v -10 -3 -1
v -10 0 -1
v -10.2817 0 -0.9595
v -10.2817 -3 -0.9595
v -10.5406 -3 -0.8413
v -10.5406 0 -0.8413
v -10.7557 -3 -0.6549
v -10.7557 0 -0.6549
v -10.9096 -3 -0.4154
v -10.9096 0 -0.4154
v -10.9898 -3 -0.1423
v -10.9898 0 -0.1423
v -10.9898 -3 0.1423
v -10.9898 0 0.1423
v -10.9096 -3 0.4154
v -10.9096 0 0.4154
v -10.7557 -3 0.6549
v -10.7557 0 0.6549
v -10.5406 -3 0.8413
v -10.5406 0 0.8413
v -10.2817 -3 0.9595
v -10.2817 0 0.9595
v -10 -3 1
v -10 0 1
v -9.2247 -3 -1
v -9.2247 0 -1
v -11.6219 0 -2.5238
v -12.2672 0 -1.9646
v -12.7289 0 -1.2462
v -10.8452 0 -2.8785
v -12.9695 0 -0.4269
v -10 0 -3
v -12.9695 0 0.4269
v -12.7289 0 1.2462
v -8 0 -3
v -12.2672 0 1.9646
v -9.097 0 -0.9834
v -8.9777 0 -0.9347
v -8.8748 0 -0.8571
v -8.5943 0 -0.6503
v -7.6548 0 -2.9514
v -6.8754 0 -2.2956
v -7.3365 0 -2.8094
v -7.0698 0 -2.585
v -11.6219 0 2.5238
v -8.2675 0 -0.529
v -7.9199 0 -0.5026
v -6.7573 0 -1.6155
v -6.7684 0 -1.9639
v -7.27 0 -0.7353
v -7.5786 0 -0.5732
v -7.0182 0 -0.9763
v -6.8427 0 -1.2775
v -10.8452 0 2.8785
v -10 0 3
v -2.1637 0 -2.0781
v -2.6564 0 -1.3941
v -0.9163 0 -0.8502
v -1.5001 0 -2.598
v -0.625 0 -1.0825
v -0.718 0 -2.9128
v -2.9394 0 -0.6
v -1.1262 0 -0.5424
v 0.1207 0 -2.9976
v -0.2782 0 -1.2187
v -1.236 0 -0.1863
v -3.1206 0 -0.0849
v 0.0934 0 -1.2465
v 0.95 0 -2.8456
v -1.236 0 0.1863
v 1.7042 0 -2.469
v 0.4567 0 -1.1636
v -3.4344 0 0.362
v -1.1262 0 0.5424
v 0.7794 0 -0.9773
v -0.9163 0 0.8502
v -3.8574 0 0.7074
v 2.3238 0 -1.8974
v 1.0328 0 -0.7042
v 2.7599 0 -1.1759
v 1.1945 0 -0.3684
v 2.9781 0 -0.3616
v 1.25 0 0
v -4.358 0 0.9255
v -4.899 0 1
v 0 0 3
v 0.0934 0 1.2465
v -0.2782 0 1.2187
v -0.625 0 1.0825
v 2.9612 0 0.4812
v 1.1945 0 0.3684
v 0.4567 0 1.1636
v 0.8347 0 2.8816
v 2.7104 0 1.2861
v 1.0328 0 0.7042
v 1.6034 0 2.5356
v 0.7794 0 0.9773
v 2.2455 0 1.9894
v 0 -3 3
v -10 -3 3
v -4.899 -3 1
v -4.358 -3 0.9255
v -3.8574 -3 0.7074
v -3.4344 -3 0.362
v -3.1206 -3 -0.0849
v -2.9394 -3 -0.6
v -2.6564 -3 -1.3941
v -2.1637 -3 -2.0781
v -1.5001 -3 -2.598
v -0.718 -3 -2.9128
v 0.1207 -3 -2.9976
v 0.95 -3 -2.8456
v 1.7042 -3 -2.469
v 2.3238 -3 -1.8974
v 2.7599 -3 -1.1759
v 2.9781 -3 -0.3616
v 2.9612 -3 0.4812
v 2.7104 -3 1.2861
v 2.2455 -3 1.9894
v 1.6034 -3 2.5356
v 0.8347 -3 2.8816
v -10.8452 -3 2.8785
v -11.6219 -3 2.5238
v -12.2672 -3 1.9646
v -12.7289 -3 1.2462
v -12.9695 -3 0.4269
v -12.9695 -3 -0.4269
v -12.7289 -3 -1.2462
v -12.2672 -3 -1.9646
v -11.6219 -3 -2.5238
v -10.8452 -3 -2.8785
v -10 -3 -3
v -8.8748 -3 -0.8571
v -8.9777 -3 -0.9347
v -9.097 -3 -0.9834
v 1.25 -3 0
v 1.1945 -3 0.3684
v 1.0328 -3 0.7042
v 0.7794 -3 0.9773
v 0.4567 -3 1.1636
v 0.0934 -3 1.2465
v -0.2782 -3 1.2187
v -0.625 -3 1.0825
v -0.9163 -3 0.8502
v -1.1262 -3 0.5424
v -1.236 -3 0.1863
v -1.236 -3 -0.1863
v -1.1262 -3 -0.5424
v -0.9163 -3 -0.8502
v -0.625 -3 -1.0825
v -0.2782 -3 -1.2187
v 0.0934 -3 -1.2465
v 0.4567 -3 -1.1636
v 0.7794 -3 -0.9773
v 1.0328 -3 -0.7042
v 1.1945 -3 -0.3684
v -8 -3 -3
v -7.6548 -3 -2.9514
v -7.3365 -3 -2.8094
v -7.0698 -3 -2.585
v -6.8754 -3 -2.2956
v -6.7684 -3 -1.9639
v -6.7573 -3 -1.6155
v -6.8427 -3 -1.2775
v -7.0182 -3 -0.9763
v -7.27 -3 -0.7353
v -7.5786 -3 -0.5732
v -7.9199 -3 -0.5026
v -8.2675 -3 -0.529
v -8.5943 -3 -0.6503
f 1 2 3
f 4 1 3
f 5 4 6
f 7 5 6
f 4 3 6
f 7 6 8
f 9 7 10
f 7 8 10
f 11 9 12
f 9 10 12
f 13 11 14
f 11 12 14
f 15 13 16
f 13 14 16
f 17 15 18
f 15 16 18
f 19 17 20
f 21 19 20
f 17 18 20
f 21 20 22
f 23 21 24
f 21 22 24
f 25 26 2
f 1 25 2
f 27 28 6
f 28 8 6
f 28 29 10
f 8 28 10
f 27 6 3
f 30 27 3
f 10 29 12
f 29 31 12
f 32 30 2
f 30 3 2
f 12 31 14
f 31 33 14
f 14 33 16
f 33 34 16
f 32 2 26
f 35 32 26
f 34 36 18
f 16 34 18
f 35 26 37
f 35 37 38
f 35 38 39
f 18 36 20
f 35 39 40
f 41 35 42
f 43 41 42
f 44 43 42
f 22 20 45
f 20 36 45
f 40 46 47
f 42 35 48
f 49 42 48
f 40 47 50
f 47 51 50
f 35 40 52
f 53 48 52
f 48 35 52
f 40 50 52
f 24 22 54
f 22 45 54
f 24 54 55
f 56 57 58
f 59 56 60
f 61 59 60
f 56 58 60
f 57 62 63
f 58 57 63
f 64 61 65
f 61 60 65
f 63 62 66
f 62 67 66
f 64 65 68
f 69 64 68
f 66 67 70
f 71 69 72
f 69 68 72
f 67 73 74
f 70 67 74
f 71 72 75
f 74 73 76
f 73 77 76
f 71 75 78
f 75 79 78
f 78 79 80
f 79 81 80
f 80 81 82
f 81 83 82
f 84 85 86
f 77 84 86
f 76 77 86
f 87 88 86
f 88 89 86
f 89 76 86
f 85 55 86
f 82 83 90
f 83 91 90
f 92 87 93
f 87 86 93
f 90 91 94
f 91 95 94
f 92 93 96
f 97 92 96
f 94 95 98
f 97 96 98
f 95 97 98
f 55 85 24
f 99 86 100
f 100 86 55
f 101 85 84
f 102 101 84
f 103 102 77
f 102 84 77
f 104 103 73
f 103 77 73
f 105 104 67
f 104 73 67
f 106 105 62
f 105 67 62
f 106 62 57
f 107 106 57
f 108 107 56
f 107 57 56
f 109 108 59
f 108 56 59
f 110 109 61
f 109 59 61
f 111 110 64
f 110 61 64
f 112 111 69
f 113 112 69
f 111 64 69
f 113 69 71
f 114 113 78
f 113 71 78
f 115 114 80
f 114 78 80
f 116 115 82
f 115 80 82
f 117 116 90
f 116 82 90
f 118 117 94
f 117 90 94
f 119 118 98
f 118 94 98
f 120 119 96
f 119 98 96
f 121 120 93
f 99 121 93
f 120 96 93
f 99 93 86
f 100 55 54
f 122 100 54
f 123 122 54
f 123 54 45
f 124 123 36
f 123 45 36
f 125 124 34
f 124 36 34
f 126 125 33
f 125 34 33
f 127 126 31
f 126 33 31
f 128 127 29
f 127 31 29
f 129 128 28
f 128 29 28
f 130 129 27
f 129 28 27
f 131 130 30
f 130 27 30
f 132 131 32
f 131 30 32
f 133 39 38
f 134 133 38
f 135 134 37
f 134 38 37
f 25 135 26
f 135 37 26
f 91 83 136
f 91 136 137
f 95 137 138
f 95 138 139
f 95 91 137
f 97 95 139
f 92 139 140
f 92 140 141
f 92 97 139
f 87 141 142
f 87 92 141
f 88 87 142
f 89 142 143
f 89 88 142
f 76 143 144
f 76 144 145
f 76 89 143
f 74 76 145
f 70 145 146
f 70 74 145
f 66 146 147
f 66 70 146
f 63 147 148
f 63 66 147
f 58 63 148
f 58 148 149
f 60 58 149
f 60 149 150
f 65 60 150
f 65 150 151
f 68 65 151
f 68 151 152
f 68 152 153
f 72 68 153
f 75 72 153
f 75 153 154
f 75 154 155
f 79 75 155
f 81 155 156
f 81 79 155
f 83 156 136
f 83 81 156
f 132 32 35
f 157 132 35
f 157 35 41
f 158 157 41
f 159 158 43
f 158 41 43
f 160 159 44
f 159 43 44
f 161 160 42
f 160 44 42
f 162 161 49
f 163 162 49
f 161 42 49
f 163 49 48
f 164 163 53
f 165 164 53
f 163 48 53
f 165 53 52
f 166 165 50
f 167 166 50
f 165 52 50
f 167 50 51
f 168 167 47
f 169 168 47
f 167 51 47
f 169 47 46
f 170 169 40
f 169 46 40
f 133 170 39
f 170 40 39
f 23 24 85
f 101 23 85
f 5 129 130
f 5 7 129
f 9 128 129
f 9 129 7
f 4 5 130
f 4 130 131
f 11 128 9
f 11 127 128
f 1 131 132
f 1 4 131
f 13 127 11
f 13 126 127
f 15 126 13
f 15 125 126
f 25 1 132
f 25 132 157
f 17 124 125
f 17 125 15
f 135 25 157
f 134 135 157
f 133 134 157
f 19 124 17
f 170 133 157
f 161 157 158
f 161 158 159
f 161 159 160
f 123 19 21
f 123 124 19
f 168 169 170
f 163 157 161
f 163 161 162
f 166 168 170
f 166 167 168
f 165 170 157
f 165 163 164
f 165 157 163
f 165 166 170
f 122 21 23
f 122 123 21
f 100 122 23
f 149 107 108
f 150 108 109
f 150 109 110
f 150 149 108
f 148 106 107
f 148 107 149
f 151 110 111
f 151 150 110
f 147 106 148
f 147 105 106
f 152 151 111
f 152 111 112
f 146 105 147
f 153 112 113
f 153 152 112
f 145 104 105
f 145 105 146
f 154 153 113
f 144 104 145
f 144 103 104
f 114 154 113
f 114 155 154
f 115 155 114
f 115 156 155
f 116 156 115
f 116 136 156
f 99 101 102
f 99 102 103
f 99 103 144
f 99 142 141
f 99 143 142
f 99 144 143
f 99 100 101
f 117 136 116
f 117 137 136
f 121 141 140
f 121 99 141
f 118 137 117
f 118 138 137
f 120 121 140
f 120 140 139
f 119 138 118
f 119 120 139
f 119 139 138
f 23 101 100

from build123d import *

# Parameters (mm, degrees)
F0_R     = 1.25
F1_DEPTH = 3


with BuildPart() as f1:
    # F0 (on Front) → F1 (new body)
    with BuildSketch(Plane.XZ):
        with BuildLine():
            ThreePointArc((-10, -1), (-11, 0), (-10, 1))
            Line((-10, 1), (-4.898979, 1))
            ThreePointArc((-4.898979, 1), (-3.634068, 0.549193), (-2.939388, -0.6))
            ThreePointArc((-2.939388, -0.6), (2.32379, -1.897367), (0, 3))
            Line((0, 3), (-10, 3))
            ThreePointArc((-10, 3), (-13, 0), (-10, -3))
            Line((-10, -3), (-10, -1))
        make_face()
        Circle(F0_R, mode=Mode.SUBTRACT)
        with BuildLine():
            Line((-9.224745, -1), (-10, -1))
            Line((-10, -1), (-10, -3))
            Line((-10, -3), (-8, -3))
            ThreePointArc((-8, -3), (-6.842725, -1.277544), (-8.874818, -0.857143))
            ThreePointArc((-8.874818, -0.857143), (-9.035763, -0.96291), (-9.224745, -1))
        make_face()
    extrude(amount=F1_DEPTH)


solid = f1.part
